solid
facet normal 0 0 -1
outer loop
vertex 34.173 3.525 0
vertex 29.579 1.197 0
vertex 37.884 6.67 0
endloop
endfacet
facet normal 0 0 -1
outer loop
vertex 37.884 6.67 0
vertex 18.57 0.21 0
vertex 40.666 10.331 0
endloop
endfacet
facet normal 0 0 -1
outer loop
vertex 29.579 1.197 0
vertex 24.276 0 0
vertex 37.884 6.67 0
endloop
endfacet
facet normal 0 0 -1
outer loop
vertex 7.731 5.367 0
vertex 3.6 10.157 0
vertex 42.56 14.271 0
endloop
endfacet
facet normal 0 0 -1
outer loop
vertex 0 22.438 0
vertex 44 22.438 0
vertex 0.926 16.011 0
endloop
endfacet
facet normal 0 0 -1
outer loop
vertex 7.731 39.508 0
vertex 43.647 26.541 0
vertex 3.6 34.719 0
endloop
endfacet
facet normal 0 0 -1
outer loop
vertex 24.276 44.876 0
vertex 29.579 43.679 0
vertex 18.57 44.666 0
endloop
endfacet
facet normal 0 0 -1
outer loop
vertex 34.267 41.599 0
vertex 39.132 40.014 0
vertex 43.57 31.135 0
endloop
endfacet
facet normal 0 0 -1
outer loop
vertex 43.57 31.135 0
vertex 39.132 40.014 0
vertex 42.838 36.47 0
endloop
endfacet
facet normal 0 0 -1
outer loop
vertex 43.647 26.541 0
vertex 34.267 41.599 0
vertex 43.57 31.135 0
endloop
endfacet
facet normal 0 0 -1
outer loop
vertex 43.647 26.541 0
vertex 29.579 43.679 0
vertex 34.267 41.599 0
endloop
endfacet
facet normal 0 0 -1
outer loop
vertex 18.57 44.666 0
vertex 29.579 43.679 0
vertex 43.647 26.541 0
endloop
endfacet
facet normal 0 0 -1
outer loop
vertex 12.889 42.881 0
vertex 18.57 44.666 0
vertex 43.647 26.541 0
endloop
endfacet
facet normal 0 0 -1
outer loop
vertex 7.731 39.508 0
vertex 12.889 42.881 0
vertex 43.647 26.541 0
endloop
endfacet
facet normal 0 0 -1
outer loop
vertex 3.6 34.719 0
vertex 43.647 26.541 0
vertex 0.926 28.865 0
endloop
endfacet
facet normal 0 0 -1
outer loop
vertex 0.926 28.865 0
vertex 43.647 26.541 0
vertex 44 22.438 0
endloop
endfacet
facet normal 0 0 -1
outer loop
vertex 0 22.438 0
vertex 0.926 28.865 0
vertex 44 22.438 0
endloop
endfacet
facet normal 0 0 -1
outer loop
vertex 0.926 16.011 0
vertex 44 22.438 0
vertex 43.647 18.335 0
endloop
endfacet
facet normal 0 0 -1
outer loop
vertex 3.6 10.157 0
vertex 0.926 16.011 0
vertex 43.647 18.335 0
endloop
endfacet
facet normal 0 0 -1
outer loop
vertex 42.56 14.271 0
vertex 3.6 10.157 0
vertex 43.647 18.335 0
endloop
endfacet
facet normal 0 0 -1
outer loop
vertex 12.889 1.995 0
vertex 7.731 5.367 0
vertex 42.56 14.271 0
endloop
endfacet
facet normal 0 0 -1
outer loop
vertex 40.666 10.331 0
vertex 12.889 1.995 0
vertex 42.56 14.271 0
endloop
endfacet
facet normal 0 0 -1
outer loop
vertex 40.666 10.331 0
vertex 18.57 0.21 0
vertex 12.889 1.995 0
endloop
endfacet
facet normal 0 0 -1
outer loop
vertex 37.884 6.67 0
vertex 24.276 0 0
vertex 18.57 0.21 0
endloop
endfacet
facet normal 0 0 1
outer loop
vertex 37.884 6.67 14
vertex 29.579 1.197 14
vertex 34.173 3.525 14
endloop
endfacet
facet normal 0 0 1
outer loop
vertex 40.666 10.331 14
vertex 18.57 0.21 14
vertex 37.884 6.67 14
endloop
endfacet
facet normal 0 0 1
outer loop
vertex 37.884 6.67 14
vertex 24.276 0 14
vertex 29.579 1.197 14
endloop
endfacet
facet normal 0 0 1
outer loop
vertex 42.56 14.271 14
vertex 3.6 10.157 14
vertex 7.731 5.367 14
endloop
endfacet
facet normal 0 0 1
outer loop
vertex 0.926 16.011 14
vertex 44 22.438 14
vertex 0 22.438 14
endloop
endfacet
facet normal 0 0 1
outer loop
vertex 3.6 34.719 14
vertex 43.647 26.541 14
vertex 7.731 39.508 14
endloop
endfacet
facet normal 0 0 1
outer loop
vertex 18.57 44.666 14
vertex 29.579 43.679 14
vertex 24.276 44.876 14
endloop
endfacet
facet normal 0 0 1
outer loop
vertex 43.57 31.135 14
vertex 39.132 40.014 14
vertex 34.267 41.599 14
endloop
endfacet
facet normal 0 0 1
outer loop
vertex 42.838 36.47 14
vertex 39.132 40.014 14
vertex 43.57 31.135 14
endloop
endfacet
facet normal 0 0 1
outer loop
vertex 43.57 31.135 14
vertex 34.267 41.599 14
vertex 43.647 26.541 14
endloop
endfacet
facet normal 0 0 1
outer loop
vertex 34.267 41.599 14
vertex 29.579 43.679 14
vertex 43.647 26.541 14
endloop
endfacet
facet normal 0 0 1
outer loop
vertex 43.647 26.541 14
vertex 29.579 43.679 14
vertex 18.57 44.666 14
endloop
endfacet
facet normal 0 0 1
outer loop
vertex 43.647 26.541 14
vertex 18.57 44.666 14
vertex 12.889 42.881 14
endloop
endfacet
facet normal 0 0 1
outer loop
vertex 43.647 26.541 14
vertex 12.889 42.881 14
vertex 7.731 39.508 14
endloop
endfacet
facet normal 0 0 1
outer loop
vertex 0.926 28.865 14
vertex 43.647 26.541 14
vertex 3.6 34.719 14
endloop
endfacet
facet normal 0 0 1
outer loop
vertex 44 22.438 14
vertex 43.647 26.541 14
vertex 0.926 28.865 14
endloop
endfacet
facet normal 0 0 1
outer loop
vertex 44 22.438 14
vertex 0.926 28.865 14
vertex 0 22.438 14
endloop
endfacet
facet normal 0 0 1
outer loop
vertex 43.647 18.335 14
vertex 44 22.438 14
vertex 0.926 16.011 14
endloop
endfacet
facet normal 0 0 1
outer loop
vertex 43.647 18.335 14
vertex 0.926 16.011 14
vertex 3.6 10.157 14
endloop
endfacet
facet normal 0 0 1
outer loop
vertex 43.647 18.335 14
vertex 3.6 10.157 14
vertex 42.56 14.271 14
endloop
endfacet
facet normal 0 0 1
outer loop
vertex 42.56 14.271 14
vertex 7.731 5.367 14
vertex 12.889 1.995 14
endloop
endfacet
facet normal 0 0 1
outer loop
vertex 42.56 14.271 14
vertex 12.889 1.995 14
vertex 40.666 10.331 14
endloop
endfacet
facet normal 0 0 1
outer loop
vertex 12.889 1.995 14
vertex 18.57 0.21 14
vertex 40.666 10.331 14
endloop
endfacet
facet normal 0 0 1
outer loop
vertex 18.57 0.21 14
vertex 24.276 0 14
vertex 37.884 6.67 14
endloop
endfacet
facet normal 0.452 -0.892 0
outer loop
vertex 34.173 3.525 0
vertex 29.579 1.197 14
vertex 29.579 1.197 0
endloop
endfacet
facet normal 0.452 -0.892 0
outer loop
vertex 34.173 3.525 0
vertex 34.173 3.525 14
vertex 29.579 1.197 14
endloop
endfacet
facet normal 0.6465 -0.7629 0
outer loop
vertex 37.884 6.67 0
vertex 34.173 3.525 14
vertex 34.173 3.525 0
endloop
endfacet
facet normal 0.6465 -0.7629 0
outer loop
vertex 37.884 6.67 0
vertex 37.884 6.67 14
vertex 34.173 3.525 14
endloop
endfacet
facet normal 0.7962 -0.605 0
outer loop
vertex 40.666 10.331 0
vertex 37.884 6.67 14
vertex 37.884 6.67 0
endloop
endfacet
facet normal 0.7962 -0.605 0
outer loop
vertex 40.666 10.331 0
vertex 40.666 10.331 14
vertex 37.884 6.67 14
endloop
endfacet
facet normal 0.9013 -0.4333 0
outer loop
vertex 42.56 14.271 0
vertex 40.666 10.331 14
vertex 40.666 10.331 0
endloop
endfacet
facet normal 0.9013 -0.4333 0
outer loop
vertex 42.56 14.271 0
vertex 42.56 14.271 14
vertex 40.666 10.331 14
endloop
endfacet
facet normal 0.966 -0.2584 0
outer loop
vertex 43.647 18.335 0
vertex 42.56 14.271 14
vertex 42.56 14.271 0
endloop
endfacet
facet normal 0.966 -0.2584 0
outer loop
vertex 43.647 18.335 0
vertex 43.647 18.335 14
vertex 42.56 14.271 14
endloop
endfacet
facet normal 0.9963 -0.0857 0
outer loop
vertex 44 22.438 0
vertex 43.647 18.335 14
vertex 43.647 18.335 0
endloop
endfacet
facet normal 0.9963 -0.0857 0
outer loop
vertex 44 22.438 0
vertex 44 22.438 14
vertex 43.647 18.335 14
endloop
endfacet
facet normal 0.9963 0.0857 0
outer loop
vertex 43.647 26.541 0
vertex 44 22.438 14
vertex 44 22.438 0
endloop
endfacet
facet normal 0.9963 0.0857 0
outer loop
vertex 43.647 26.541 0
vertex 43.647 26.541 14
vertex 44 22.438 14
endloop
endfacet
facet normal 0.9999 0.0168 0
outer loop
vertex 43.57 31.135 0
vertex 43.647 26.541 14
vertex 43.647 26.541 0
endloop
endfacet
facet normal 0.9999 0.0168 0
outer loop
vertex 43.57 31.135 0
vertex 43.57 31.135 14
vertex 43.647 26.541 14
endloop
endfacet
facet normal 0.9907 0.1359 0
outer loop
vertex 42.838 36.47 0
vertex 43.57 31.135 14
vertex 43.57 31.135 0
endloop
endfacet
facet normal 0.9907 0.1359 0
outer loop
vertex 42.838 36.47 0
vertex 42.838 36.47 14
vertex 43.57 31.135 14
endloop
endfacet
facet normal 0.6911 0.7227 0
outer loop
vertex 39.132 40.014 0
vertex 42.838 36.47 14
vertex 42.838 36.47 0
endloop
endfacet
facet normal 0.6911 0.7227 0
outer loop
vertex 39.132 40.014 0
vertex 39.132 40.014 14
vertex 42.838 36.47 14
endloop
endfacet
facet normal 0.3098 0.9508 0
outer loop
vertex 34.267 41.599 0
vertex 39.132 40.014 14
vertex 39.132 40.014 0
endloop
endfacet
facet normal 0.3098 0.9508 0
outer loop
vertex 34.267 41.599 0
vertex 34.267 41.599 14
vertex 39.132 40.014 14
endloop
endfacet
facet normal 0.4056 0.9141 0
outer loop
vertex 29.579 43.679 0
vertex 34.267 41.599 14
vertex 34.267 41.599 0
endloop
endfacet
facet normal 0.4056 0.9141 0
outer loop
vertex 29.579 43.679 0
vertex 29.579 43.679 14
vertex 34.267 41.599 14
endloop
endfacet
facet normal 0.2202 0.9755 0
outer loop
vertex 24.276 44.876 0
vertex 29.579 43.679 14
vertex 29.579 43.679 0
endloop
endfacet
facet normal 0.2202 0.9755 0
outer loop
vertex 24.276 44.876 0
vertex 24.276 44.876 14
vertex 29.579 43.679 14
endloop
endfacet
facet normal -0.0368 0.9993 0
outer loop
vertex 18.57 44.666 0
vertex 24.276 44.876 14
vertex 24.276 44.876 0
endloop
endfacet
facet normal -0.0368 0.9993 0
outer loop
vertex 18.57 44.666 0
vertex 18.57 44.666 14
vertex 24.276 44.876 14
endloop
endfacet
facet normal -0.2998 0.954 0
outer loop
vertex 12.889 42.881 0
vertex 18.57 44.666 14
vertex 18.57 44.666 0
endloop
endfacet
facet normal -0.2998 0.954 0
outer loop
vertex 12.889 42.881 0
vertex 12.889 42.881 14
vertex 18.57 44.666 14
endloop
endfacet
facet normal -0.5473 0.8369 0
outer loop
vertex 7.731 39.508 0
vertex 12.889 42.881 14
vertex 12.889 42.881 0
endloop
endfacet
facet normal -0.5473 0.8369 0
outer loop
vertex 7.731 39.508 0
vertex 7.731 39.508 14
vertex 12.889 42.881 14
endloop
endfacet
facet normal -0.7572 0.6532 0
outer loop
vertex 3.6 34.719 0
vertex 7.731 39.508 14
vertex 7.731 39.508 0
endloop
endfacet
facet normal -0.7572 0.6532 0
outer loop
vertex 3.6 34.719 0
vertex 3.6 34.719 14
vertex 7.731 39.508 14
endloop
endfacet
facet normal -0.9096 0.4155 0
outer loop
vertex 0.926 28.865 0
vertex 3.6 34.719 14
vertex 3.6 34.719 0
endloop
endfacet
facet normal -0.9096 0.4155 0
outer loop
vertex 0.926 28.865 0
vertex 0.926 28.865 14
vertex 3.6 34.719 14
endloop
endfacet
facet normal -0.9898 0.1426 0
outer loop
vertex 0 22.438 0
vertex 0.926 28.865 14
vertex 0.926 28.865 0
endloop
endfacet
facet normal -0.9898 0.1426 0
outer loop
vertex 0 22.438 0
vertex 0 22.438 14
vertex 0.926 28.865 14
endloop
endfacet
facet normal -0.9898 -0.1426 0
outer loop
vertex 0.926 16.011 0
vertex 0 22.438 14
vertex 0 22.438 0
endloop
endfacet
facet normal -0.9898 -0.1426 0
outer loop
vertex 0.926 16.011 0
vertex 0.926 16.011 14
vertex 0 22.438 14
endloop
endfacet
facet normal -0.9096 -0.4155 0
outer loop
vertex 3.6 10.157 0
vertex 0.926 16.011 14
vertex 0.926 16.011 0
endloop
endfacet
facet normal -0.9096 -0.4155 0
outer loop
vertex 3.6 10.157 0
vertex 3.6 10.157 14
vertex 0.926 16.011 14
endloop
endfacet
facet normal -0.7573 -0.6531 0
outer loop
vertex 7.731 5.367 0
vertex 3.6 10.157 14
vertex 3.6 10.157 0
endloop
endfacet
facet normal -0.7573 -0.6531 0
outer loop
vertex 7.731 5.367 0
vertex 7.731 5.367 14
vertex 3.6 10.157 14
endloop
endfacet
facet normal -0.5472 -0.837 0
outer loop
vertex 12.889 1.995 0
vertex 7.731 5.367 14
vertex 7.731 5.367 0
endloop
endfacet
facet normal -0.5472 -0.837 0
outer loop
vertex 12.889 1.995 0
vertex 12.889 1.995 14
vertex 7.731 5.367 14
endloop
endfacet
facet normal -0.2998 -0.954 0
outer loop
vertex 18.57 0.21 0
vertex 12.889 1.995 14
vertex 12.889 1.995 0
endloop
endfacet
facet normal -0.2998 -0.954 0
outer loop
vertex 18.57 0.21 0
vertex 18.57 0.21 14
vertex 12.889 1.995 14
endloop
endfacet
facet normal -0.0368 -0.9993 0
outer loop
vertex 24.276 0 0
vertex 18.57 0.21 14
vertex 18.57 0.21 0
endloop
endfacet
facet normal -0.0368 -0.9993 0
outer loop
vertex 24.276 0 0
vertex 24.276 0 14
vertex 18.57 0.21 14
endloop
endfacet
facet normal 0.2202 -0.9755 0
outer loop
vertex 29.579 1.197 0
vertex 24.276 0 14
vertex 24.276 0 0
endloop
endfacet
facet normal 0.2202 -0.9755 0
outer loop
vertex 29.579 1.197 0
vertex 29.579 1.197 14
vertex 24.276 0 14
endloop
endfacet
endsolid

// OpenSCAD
$fn = 32;

// ----------------------------------------------------------------------
// Cam disc: base radius 17.0 mm, lift 10.0 mm, 26 profile points
// ----------------------------------------------------------------------

// --- parameters (mm) ---
profile_height = 14;      // extrusion height
profile_points = 26;      // points of the closed outline

profile = [[44, 22.438], [43.647, 26.541], [43.57, 31.135], [42.838, 36.47], [39.132, 40.014], [34.267, 41.599], [29.579, 43.679], [24.276, 44.876], [18.57, 44.666], [12.889, 42.881], [7.731, 39.508], [3.6, 34.719], [0.926, 28.865], [0, 22.438], [0.926, 16.011], [3.6, 10.157], [7.731, 5.367], [12.889, 1.995], [18.57, 0.21], [24.276, 0], [29.579, 1.197], [34.173, 3.525], [37.884, 6.67], [40.666, 10.331], [42.56, 14.271], [43.647, 18.335]];  // single closed polygon, 26 points, counter clockwise

// --- the one profile operation ---
linear_extrude(height = profile_height) polygon(points = profile);
